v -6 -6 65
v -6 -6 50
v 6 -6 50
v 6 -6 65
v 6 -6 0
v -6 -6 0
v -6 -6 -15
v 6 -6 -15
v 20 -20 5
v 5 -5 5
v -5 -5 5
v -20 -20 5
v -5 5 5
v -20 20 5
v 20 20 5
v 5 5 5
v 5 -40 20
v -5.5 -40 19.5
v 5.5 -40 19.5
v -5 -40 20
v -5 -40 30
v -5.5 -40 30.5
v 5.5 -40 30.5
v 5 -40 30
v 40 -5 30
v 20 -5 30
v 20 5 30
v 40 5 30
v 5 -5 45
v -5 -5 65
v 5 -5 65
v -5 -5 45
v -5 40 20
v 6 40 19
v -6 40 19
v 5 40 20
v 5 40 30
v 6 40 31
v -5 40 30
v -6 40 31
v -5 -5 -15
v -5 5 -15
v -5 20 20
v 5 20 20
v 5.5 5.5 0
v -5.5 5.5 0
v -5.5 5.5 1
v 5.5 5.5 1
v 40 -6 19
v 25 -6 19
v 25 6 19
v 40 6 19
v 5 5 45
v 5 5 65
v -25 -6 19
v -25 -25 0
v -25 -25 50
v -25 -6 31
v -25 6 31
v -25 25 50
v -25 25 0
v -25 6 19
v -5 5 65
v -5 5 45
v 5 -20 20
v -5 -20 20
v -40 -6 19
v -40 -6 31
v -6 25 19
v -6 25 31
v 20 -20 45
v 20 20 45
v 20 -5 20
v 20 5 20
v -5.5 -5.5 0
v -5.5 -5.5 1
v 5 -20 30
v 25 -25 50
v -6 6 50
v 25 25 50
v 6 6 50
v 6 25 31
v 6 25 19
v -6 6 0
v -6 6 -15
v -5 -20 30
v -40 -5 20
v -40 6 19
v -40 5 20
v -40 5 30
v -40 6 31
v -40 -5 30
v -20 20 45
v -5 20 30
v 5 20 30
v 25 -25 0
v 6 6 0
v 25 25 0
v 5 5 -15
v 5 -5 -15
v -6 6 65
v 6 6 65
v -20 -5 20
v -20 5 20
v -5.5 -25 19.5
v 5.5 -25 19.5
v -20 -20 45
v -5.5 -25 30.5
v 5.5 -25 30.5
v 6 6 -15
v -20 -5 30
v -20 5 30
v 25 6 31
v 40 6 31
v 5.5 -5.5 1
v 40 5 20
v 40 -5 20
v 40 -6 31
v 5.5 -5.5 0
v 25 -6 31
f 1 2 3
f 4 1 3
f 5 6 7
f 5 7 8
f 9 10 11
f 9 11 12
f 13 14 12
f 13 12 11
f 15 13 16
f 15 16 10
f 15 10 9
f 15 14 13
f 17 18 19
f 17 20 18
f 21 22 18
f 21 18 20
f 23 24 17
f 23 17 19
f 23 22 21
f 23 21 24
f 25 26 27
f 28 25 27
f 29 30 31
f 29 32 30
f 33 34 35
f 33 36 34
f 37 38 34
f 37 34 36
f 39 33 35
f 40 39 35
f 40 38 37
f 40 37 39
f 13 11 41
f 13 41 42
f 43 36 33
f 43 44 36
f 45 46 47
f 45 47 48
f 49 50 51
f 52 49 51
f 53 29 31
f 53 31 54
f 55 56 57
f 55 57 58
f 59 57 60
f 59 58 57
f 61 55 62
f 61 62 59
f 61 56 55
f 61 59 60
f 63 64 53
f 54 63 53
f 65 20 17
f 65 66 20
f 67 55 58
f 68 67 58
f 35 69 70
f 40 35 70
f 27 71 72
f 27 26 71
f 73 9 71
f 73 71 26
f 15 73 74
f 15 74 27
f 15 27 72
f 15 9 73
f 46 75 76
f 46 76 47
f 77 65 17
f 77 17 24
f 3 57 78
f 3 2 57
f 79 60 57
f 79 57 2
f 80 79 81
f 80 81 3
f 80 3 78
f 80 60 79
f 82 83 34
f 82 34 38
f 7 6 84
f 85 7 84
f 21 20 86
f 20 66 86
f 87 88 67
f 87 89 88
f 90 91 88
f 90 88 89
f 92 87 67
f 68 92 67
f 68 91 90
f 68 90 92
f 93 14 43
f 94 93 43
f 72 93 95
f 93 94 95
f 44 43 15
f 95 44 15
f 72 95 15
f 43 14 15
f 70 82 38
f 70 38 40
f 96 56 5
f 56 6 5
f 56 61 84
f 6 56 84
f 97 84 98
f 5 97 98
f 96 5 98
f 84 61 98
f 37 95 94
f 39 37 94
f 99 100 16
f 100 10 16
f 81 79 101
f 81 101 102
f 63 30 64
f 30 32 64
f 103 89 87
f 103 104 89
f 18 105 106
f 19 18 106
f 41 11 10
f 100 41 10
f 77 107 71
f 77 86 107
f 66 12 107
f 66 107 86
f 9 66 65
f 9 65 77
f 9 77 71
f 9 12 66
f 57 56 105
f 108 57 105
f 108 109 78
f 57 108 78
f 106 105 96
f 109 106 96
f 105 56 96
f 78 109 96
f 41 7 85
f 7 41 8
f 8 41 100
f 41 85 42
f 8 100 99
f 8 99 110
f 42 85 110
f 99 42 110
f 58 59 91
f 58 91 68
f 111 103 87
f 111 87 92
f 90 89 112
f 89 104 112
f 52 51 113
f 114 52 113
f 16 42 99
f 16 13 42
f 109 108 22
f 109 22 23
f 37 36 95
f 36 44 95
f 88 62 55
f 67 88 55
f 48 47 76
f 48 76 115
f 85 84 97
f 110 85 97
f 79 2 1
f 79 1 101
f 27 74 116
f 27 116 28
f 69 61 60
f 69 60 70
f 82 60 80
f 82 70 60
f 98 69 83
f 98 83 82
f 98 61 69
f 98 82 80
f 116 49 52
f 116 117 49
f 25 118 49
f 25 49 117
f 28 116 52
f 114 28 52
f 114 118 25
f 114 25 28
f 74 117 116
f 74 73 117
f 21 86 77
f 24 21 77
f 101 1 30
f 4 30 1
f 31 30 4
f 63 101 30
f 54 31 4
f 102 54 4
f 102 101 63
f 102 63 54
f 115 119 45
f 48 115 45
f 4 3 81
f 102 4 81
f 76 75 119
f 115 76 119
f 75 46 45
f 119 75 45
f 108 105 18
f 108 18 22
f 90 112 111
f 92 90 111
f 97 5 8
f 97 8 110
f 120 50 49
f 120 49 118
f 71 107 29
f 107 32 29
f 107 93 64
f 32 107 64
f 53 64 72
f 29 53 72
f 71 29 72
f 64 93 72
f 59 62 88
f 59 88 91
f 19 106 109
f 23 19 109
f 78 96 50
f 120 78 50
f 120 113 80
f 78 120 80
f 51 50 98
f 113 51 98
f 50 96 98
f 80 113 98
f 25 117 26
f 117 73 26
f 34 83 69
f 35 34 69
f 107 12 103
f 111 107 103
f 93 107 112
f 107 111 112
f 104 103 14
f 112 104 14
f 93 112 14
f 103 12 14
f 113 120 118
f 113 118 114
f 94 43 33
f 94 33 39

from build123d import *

# Parameters (mm, degrees)
F0_W      = 50
F0_H      = 50
F0_W_2    = 40
F0_H_2    = 40
F1_DEPTH  = 50
F2_DEPTH  = 5
F3_W      = 40
F3_H      = 40
F4_DEPTH  = 5
F5_W      = 10
F5_H      = 10
F6_DEPTH  = 10
F7_W      = 10
F7_H      = 10
F8_DEPTH  = 10
F9_W      = 10
F9_H      = 10
F10_DEPTH = 10
F11_W     = 10
F11_H     = 10
F12_DEPTH = 10
F13_W     = 10
F13_H     = 10
F14_DEPTH = 10
F15_W     = 10
F15_H     = 10
F16_DEPTH = 10
F17_W     = 11
F17_H     = 11
F17_W_2   = 10
F17_H_2   = 10
F18_DEPTH = 15
F19_W     = 12
F19_H     = 12
F19_W_2   = 10
F19_H_2   = 10
F20_DEPTH = 15
F21_W     = 12
F21_H     = 12
F21_W_2   = 10
F21_H_2   = 10
F22_DEPTH = 15
F23_W     = 12
F23_H     = 12
F23_W_2   = 10
F23_H_2   = 10
F24_DEPTH = 15
F25_W     = 12
F25_H     = 12
F25_W_2   = 10
F25_H_2   = 10
F26_DEPTH = 15
F27_W     = 12
F27_H     = 12
F27_W_2   = 10
F27_H_2   = 10
F28_DEPTH = 15
F29_W     = 11
F29_H     = 11
F30_DEPTH = 1


with BuildPart() as f1:
    # F0 (on Top) → F1 (new body)
    with BuildSketch(Plane.XY):
        Rectangle(F0_W, F0_H)
        Rectangle(F0_W_2, F0_H_2, mode=Mode.SUBTRACT)
    extrude(amount=F1_DEPTH)

    # F0 (on Top) → F2 (join)
    with BuildSketch(Plane.XY):
        Rectangle(F0_W_2, F0_H_2)
    extrude(amount=F2_DEPTH)

    # F3 (on face) → F4 (join)
    with BuildSketch(Plane.XY.offset(50)):
        Rectangle(F3_W, F3_H)
    extrude(amount=-F4_DEPTH)

    # F5 (on face) → F6 (cut)
    with BuildSketch(Plane.XY.offset(50)):
        Rectangle(F5_W, F5_H)
    extrude(amount=-F6_DEPTH, mode=Mode.SUBTRACT)

    # F7 (on face) → F8 (cut)
    with BuildSketch(Plane.XZ.offset(25)):
        with Locations((0, 25)):
            Rectangle(F7_W, F7_H)
    extrude(amount=-F8_DEPTH, mode=Mode.SUBTRACT)

    # F9 (on face) → F10 (cut)
    with BuildSketch(Plane(origin=(0, 0, 0), x_dir=(1, 0, 0), z_dir=(0, 0, -1))):
        Rectangle(F9_W, F9_H)
    extrude(amount=-F10_DEPTH, mode=Mode.SUBTRACT)

    # F11 (on face) → F12 (cut)
    with BuildSketch(Plane(origin=(0, 25, 0), x_dir=(-1, 0, 0), z_dir=(0, 1, 0))):
        with Locations((0, 25)):
            Rectangle(F11_W, F11_H)
    extrude(amount=-F12_DEPTH, mode=Mode.SUBTRACT)

    # F13 (on face) → F14 (cut)
    with BuildSketch(Plane(origin=(-25, 0, 0), x_dir=(0, -1, 0), z_dir=(-1, 0, 0))):
        with Locations((0, 25)):
            Rectangle(F13_W, F13_H)
    extrude(amount=-F14_DEPTH, mode=Mode.SUBTRACT)

    # F15 (on face) → F16 (cut)
    with BuildSketch(Plane.YZ.offset(25)):
        with Locations((0, 25)):
            Rectangle(F15_W, F15_H)
    extrude(amount=-F16_DEPTH, mode=Mode.SUBTRACT)

    # F17 (on face) → F18 (join)
    with BuildSketch(Plane.XZ.offset(25)):
        with Locations((0, 25)):
            Rectangle(F17_W, F17_H)
        with Locations((0, 25)):
            Rectangle(F17_W_2, F17_H_2, mode=Mode.SUBTRACT)
    extrude(amount=F18_DEPTH)

    # F19 (on face) → F20 (join)
    with BuildSketch(Plane.XY.offset(50)):
        Rectangle(F19_W, F19_H)
        Rectangle(F19_W_2, F19_H_2, mode=Mode.SUBTRACT)
    extrude(amount=F20_DEPTH)

    # F21 (on face) → F22 (join)
    with BuildSketch(Plane(origin=(0, 25, 0), x_dir=(-1, 0, 0), z_dir=(0, 1, 0))):
        with Locations((0, 25)):
            Rectangle(F21_W, F21_H)
        with Locations((0, 25)):
            Rectangle(F21_W_2, F21_H_2, mode=Mode.SUBTRACT)
    extrude(amount=F22_DEPTH)

    # F23 (on face) → F24 (join)
    with BuildSketch(Plane.XY):
        Rectangle(F23_W, F23_H)
        Rectangle(F23_W_2, F23_H_2, mode=Mode.SUBTRACT)
    extrude(amount=-F24_DEPTH)

    # F25 (on face) → F26 (join)
    with BuildSketch(Plane.YZ.offset(25)):
        with Locations((0, 25)):
            Rectangle(F25_W, F25_H)
        with Locations((0, 25)):
            Rectangle(F25_W_2, F25_H_2, mode=Mode.SUBTRACT)
    extrude(amount=F26_DEPTH)

    # F27 (on face) → F28 (join)
    with BuildSketch(Plane(origin=(-25, 0, 0), x_dir=(0, -1, 0), z_dir=(-1, 0, 0))):
        with Locations((0, 25)):
            Rectangle(F27_W, F27_H)
        with Locations((0, 25)):
            Rectangle(F27_W_2, F27_H_2, mode=Mode.SUBTRACT)
    extrude(amount=F28_DEPTH)


with BuildPart() as f30:
    # F29 (on Top) → F30 (new body)
    with BuildSketch(Plane.XY):
        Rectangle(F29_W, F29_H)
    extrude(amount=F30_DEPTH)


solid = Compound([f1.part, f30.part])
